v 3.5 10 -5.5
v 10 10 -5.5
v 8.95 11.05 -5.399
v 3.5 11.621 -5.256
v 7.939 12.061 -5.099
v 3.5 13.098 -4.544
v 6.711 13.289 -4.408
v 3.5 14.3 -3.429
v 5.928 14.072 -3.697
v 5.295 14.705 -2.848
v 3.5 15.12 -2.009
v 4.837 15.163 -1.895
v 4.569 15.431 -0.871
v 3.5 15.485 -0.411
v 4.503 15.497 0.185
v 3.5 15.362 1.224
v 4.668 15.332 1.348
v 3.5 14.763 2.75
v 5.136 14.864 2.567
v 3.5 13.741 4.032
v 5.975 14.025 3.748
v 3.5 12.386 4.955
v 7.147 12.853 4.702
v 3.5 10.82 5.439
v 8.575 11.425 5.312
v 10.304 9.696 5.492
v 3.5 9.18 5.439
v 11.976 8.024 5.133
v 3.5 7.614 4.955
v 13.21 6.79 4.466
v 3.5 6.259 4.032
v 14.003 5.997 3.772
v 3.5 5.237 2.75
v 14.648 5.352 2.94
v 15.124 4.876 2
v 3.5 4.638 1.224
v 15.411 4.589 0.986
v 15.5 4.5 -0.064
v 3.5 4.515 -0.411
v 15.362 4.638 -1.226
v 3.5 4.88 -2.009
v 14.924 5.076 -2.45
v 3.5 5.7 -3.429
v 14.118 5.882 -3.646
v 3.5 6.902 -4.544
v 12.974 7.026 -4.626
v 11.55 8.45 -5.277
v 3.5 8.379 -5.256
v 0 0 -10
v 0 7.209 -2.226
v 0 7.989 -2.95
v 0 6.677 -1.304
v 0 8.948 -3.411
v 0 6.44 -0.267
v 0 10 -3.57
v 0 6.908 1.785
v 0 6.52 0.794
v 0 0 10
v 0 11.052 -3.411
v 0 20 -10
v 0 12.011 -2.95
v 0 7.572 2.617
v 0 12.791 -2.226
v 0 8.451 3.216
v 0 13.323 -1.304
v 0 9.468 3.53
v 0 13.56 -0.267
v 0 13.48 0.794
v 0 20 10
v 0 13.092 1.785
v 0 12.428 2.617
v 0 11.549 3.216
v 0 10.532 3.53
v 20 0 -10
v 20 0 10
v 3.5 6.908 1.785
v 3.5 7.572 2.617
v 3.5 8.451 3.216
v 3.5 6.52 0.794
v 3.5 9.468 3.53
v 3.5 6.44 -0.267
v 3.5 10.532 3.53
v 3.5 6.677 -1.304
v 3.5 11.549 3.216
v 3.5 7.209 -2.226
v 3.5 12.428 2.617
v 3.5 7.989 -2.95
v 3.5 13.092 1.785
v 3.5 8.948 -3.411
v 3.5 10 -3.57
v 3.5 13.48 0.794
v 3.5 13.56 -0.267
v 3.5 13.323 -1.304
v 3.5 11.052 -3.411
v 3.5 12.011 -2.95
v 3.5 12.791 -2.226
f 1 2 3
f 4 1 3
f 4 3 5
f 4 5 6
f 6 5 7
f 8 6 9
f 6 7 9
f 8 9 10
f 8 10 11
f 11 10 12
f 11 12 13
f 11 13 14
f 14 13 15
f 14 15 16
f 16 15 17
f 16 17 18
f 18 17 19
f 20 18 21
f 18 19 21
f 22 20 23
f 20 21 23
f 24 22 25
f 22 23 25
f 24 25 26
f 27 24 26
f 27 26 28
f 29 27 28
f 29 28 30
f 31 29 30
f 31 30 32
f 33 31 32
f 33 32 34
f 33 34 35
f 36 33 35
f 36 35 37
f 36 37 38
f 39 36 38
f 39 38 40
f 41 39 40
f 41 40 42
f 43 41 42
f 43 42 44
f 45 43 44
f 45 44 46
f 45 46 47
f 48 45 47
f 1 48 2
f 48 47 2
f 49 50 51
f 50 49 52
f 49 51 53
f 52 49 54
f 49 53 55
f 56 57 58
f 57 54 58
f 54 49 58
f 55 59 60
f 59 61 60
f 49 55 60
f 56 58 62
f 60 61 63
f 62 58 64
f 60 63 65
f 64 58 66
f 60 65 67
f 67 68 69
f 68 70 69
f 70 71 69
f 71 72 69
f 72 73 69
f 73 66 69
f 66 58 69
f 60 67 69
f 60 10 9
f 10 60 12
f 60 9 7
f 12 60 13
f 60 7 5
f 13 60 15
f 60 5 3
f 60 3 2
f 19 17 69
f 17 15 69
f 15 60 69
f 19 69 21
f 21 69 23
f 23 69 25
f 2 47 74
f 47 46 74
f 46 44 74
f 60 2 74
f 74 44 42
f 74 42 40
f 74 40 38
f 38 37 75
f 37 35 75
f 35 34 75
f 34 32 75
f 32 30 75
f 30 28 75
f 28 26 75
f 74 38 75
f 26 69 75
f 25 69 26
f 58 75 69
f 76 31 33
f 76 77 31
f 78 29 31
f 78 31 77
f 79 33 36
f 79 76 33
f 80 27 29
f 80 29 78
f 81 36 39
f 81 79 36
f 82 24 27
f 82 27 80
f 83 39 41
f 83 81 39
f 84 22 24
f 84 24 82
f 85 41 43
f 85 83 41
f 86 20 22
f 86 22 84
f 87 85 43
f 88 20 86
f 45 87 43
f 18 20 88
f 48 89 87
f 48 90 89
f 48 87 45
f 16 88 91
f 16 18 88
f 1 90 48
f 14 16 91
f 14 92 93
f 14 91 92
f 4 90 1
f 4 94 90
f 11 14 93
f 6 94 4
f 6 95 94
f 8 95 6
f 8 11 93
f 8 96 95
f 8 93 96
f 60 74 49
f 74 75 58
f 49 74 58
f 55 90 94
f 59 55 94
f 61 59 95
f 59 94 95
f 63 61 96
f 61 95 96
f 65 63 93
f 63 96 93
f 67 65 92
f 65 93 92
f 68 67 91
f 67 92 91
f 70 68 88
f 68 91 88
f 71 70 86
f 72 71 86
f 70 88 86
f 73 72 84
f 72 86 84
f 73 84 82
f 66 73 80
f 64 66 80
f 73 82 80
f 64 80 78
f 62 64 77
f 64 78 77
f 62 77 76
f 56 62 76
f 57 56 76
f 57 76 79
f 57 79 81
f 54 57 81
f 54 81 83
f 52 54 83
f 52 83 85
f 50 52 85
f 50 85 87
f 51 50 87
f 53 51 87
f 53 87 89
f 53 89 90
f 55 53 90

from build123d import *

# Parameters (mm, degrees)
BOSS_EXTRUDE1_DEPTH = 10
SKETCH2_R           = 3.57
CUT_EXTRUDE1_DEPTH  = 21
SKETCH3_R           = 5.5
CUT_EXTRUDE2_DEPTH  = 16.5


with BuildPart() as part:
    # Sketch1 → Boss-Extrude1 (new body, symmetric)
    with BuildSketch(Plane.XY):
        Polygon((0, 0), (0, 20), (20, 0), align=None)
    extrude(amount=BOSS_EXTRUDE1_DEPTH, both=True)

    # Sketch2 → Cut-Extrude1 (cut, through all)
    with BuildSketch(Plane(origin=(20, 0, 0), x_dir=(0, 0, -1), z_dir=(1, 0, 0))):
        with Locations((0, 10)):
            Circle(SKETCH2_R)
    extrude(amount=-CUT_EXTRUDE1_DEPTH, mode=Mode.SUBTRACT)

    # Sketch3 → Cut-Extrude2 (cut)
    with BuildSketch(Plane(origin=(20, 0, 0), x_dir=(0, 0, -1), z_dir=(1, 0, 0))):
        with Locations((0, 10)):
            Circle(SKETCH3_R)
    extrude(amount=-CUT_EXTRUDE2_DEPTH, mode=Mode.SUBTRACT)


solid = part.part
